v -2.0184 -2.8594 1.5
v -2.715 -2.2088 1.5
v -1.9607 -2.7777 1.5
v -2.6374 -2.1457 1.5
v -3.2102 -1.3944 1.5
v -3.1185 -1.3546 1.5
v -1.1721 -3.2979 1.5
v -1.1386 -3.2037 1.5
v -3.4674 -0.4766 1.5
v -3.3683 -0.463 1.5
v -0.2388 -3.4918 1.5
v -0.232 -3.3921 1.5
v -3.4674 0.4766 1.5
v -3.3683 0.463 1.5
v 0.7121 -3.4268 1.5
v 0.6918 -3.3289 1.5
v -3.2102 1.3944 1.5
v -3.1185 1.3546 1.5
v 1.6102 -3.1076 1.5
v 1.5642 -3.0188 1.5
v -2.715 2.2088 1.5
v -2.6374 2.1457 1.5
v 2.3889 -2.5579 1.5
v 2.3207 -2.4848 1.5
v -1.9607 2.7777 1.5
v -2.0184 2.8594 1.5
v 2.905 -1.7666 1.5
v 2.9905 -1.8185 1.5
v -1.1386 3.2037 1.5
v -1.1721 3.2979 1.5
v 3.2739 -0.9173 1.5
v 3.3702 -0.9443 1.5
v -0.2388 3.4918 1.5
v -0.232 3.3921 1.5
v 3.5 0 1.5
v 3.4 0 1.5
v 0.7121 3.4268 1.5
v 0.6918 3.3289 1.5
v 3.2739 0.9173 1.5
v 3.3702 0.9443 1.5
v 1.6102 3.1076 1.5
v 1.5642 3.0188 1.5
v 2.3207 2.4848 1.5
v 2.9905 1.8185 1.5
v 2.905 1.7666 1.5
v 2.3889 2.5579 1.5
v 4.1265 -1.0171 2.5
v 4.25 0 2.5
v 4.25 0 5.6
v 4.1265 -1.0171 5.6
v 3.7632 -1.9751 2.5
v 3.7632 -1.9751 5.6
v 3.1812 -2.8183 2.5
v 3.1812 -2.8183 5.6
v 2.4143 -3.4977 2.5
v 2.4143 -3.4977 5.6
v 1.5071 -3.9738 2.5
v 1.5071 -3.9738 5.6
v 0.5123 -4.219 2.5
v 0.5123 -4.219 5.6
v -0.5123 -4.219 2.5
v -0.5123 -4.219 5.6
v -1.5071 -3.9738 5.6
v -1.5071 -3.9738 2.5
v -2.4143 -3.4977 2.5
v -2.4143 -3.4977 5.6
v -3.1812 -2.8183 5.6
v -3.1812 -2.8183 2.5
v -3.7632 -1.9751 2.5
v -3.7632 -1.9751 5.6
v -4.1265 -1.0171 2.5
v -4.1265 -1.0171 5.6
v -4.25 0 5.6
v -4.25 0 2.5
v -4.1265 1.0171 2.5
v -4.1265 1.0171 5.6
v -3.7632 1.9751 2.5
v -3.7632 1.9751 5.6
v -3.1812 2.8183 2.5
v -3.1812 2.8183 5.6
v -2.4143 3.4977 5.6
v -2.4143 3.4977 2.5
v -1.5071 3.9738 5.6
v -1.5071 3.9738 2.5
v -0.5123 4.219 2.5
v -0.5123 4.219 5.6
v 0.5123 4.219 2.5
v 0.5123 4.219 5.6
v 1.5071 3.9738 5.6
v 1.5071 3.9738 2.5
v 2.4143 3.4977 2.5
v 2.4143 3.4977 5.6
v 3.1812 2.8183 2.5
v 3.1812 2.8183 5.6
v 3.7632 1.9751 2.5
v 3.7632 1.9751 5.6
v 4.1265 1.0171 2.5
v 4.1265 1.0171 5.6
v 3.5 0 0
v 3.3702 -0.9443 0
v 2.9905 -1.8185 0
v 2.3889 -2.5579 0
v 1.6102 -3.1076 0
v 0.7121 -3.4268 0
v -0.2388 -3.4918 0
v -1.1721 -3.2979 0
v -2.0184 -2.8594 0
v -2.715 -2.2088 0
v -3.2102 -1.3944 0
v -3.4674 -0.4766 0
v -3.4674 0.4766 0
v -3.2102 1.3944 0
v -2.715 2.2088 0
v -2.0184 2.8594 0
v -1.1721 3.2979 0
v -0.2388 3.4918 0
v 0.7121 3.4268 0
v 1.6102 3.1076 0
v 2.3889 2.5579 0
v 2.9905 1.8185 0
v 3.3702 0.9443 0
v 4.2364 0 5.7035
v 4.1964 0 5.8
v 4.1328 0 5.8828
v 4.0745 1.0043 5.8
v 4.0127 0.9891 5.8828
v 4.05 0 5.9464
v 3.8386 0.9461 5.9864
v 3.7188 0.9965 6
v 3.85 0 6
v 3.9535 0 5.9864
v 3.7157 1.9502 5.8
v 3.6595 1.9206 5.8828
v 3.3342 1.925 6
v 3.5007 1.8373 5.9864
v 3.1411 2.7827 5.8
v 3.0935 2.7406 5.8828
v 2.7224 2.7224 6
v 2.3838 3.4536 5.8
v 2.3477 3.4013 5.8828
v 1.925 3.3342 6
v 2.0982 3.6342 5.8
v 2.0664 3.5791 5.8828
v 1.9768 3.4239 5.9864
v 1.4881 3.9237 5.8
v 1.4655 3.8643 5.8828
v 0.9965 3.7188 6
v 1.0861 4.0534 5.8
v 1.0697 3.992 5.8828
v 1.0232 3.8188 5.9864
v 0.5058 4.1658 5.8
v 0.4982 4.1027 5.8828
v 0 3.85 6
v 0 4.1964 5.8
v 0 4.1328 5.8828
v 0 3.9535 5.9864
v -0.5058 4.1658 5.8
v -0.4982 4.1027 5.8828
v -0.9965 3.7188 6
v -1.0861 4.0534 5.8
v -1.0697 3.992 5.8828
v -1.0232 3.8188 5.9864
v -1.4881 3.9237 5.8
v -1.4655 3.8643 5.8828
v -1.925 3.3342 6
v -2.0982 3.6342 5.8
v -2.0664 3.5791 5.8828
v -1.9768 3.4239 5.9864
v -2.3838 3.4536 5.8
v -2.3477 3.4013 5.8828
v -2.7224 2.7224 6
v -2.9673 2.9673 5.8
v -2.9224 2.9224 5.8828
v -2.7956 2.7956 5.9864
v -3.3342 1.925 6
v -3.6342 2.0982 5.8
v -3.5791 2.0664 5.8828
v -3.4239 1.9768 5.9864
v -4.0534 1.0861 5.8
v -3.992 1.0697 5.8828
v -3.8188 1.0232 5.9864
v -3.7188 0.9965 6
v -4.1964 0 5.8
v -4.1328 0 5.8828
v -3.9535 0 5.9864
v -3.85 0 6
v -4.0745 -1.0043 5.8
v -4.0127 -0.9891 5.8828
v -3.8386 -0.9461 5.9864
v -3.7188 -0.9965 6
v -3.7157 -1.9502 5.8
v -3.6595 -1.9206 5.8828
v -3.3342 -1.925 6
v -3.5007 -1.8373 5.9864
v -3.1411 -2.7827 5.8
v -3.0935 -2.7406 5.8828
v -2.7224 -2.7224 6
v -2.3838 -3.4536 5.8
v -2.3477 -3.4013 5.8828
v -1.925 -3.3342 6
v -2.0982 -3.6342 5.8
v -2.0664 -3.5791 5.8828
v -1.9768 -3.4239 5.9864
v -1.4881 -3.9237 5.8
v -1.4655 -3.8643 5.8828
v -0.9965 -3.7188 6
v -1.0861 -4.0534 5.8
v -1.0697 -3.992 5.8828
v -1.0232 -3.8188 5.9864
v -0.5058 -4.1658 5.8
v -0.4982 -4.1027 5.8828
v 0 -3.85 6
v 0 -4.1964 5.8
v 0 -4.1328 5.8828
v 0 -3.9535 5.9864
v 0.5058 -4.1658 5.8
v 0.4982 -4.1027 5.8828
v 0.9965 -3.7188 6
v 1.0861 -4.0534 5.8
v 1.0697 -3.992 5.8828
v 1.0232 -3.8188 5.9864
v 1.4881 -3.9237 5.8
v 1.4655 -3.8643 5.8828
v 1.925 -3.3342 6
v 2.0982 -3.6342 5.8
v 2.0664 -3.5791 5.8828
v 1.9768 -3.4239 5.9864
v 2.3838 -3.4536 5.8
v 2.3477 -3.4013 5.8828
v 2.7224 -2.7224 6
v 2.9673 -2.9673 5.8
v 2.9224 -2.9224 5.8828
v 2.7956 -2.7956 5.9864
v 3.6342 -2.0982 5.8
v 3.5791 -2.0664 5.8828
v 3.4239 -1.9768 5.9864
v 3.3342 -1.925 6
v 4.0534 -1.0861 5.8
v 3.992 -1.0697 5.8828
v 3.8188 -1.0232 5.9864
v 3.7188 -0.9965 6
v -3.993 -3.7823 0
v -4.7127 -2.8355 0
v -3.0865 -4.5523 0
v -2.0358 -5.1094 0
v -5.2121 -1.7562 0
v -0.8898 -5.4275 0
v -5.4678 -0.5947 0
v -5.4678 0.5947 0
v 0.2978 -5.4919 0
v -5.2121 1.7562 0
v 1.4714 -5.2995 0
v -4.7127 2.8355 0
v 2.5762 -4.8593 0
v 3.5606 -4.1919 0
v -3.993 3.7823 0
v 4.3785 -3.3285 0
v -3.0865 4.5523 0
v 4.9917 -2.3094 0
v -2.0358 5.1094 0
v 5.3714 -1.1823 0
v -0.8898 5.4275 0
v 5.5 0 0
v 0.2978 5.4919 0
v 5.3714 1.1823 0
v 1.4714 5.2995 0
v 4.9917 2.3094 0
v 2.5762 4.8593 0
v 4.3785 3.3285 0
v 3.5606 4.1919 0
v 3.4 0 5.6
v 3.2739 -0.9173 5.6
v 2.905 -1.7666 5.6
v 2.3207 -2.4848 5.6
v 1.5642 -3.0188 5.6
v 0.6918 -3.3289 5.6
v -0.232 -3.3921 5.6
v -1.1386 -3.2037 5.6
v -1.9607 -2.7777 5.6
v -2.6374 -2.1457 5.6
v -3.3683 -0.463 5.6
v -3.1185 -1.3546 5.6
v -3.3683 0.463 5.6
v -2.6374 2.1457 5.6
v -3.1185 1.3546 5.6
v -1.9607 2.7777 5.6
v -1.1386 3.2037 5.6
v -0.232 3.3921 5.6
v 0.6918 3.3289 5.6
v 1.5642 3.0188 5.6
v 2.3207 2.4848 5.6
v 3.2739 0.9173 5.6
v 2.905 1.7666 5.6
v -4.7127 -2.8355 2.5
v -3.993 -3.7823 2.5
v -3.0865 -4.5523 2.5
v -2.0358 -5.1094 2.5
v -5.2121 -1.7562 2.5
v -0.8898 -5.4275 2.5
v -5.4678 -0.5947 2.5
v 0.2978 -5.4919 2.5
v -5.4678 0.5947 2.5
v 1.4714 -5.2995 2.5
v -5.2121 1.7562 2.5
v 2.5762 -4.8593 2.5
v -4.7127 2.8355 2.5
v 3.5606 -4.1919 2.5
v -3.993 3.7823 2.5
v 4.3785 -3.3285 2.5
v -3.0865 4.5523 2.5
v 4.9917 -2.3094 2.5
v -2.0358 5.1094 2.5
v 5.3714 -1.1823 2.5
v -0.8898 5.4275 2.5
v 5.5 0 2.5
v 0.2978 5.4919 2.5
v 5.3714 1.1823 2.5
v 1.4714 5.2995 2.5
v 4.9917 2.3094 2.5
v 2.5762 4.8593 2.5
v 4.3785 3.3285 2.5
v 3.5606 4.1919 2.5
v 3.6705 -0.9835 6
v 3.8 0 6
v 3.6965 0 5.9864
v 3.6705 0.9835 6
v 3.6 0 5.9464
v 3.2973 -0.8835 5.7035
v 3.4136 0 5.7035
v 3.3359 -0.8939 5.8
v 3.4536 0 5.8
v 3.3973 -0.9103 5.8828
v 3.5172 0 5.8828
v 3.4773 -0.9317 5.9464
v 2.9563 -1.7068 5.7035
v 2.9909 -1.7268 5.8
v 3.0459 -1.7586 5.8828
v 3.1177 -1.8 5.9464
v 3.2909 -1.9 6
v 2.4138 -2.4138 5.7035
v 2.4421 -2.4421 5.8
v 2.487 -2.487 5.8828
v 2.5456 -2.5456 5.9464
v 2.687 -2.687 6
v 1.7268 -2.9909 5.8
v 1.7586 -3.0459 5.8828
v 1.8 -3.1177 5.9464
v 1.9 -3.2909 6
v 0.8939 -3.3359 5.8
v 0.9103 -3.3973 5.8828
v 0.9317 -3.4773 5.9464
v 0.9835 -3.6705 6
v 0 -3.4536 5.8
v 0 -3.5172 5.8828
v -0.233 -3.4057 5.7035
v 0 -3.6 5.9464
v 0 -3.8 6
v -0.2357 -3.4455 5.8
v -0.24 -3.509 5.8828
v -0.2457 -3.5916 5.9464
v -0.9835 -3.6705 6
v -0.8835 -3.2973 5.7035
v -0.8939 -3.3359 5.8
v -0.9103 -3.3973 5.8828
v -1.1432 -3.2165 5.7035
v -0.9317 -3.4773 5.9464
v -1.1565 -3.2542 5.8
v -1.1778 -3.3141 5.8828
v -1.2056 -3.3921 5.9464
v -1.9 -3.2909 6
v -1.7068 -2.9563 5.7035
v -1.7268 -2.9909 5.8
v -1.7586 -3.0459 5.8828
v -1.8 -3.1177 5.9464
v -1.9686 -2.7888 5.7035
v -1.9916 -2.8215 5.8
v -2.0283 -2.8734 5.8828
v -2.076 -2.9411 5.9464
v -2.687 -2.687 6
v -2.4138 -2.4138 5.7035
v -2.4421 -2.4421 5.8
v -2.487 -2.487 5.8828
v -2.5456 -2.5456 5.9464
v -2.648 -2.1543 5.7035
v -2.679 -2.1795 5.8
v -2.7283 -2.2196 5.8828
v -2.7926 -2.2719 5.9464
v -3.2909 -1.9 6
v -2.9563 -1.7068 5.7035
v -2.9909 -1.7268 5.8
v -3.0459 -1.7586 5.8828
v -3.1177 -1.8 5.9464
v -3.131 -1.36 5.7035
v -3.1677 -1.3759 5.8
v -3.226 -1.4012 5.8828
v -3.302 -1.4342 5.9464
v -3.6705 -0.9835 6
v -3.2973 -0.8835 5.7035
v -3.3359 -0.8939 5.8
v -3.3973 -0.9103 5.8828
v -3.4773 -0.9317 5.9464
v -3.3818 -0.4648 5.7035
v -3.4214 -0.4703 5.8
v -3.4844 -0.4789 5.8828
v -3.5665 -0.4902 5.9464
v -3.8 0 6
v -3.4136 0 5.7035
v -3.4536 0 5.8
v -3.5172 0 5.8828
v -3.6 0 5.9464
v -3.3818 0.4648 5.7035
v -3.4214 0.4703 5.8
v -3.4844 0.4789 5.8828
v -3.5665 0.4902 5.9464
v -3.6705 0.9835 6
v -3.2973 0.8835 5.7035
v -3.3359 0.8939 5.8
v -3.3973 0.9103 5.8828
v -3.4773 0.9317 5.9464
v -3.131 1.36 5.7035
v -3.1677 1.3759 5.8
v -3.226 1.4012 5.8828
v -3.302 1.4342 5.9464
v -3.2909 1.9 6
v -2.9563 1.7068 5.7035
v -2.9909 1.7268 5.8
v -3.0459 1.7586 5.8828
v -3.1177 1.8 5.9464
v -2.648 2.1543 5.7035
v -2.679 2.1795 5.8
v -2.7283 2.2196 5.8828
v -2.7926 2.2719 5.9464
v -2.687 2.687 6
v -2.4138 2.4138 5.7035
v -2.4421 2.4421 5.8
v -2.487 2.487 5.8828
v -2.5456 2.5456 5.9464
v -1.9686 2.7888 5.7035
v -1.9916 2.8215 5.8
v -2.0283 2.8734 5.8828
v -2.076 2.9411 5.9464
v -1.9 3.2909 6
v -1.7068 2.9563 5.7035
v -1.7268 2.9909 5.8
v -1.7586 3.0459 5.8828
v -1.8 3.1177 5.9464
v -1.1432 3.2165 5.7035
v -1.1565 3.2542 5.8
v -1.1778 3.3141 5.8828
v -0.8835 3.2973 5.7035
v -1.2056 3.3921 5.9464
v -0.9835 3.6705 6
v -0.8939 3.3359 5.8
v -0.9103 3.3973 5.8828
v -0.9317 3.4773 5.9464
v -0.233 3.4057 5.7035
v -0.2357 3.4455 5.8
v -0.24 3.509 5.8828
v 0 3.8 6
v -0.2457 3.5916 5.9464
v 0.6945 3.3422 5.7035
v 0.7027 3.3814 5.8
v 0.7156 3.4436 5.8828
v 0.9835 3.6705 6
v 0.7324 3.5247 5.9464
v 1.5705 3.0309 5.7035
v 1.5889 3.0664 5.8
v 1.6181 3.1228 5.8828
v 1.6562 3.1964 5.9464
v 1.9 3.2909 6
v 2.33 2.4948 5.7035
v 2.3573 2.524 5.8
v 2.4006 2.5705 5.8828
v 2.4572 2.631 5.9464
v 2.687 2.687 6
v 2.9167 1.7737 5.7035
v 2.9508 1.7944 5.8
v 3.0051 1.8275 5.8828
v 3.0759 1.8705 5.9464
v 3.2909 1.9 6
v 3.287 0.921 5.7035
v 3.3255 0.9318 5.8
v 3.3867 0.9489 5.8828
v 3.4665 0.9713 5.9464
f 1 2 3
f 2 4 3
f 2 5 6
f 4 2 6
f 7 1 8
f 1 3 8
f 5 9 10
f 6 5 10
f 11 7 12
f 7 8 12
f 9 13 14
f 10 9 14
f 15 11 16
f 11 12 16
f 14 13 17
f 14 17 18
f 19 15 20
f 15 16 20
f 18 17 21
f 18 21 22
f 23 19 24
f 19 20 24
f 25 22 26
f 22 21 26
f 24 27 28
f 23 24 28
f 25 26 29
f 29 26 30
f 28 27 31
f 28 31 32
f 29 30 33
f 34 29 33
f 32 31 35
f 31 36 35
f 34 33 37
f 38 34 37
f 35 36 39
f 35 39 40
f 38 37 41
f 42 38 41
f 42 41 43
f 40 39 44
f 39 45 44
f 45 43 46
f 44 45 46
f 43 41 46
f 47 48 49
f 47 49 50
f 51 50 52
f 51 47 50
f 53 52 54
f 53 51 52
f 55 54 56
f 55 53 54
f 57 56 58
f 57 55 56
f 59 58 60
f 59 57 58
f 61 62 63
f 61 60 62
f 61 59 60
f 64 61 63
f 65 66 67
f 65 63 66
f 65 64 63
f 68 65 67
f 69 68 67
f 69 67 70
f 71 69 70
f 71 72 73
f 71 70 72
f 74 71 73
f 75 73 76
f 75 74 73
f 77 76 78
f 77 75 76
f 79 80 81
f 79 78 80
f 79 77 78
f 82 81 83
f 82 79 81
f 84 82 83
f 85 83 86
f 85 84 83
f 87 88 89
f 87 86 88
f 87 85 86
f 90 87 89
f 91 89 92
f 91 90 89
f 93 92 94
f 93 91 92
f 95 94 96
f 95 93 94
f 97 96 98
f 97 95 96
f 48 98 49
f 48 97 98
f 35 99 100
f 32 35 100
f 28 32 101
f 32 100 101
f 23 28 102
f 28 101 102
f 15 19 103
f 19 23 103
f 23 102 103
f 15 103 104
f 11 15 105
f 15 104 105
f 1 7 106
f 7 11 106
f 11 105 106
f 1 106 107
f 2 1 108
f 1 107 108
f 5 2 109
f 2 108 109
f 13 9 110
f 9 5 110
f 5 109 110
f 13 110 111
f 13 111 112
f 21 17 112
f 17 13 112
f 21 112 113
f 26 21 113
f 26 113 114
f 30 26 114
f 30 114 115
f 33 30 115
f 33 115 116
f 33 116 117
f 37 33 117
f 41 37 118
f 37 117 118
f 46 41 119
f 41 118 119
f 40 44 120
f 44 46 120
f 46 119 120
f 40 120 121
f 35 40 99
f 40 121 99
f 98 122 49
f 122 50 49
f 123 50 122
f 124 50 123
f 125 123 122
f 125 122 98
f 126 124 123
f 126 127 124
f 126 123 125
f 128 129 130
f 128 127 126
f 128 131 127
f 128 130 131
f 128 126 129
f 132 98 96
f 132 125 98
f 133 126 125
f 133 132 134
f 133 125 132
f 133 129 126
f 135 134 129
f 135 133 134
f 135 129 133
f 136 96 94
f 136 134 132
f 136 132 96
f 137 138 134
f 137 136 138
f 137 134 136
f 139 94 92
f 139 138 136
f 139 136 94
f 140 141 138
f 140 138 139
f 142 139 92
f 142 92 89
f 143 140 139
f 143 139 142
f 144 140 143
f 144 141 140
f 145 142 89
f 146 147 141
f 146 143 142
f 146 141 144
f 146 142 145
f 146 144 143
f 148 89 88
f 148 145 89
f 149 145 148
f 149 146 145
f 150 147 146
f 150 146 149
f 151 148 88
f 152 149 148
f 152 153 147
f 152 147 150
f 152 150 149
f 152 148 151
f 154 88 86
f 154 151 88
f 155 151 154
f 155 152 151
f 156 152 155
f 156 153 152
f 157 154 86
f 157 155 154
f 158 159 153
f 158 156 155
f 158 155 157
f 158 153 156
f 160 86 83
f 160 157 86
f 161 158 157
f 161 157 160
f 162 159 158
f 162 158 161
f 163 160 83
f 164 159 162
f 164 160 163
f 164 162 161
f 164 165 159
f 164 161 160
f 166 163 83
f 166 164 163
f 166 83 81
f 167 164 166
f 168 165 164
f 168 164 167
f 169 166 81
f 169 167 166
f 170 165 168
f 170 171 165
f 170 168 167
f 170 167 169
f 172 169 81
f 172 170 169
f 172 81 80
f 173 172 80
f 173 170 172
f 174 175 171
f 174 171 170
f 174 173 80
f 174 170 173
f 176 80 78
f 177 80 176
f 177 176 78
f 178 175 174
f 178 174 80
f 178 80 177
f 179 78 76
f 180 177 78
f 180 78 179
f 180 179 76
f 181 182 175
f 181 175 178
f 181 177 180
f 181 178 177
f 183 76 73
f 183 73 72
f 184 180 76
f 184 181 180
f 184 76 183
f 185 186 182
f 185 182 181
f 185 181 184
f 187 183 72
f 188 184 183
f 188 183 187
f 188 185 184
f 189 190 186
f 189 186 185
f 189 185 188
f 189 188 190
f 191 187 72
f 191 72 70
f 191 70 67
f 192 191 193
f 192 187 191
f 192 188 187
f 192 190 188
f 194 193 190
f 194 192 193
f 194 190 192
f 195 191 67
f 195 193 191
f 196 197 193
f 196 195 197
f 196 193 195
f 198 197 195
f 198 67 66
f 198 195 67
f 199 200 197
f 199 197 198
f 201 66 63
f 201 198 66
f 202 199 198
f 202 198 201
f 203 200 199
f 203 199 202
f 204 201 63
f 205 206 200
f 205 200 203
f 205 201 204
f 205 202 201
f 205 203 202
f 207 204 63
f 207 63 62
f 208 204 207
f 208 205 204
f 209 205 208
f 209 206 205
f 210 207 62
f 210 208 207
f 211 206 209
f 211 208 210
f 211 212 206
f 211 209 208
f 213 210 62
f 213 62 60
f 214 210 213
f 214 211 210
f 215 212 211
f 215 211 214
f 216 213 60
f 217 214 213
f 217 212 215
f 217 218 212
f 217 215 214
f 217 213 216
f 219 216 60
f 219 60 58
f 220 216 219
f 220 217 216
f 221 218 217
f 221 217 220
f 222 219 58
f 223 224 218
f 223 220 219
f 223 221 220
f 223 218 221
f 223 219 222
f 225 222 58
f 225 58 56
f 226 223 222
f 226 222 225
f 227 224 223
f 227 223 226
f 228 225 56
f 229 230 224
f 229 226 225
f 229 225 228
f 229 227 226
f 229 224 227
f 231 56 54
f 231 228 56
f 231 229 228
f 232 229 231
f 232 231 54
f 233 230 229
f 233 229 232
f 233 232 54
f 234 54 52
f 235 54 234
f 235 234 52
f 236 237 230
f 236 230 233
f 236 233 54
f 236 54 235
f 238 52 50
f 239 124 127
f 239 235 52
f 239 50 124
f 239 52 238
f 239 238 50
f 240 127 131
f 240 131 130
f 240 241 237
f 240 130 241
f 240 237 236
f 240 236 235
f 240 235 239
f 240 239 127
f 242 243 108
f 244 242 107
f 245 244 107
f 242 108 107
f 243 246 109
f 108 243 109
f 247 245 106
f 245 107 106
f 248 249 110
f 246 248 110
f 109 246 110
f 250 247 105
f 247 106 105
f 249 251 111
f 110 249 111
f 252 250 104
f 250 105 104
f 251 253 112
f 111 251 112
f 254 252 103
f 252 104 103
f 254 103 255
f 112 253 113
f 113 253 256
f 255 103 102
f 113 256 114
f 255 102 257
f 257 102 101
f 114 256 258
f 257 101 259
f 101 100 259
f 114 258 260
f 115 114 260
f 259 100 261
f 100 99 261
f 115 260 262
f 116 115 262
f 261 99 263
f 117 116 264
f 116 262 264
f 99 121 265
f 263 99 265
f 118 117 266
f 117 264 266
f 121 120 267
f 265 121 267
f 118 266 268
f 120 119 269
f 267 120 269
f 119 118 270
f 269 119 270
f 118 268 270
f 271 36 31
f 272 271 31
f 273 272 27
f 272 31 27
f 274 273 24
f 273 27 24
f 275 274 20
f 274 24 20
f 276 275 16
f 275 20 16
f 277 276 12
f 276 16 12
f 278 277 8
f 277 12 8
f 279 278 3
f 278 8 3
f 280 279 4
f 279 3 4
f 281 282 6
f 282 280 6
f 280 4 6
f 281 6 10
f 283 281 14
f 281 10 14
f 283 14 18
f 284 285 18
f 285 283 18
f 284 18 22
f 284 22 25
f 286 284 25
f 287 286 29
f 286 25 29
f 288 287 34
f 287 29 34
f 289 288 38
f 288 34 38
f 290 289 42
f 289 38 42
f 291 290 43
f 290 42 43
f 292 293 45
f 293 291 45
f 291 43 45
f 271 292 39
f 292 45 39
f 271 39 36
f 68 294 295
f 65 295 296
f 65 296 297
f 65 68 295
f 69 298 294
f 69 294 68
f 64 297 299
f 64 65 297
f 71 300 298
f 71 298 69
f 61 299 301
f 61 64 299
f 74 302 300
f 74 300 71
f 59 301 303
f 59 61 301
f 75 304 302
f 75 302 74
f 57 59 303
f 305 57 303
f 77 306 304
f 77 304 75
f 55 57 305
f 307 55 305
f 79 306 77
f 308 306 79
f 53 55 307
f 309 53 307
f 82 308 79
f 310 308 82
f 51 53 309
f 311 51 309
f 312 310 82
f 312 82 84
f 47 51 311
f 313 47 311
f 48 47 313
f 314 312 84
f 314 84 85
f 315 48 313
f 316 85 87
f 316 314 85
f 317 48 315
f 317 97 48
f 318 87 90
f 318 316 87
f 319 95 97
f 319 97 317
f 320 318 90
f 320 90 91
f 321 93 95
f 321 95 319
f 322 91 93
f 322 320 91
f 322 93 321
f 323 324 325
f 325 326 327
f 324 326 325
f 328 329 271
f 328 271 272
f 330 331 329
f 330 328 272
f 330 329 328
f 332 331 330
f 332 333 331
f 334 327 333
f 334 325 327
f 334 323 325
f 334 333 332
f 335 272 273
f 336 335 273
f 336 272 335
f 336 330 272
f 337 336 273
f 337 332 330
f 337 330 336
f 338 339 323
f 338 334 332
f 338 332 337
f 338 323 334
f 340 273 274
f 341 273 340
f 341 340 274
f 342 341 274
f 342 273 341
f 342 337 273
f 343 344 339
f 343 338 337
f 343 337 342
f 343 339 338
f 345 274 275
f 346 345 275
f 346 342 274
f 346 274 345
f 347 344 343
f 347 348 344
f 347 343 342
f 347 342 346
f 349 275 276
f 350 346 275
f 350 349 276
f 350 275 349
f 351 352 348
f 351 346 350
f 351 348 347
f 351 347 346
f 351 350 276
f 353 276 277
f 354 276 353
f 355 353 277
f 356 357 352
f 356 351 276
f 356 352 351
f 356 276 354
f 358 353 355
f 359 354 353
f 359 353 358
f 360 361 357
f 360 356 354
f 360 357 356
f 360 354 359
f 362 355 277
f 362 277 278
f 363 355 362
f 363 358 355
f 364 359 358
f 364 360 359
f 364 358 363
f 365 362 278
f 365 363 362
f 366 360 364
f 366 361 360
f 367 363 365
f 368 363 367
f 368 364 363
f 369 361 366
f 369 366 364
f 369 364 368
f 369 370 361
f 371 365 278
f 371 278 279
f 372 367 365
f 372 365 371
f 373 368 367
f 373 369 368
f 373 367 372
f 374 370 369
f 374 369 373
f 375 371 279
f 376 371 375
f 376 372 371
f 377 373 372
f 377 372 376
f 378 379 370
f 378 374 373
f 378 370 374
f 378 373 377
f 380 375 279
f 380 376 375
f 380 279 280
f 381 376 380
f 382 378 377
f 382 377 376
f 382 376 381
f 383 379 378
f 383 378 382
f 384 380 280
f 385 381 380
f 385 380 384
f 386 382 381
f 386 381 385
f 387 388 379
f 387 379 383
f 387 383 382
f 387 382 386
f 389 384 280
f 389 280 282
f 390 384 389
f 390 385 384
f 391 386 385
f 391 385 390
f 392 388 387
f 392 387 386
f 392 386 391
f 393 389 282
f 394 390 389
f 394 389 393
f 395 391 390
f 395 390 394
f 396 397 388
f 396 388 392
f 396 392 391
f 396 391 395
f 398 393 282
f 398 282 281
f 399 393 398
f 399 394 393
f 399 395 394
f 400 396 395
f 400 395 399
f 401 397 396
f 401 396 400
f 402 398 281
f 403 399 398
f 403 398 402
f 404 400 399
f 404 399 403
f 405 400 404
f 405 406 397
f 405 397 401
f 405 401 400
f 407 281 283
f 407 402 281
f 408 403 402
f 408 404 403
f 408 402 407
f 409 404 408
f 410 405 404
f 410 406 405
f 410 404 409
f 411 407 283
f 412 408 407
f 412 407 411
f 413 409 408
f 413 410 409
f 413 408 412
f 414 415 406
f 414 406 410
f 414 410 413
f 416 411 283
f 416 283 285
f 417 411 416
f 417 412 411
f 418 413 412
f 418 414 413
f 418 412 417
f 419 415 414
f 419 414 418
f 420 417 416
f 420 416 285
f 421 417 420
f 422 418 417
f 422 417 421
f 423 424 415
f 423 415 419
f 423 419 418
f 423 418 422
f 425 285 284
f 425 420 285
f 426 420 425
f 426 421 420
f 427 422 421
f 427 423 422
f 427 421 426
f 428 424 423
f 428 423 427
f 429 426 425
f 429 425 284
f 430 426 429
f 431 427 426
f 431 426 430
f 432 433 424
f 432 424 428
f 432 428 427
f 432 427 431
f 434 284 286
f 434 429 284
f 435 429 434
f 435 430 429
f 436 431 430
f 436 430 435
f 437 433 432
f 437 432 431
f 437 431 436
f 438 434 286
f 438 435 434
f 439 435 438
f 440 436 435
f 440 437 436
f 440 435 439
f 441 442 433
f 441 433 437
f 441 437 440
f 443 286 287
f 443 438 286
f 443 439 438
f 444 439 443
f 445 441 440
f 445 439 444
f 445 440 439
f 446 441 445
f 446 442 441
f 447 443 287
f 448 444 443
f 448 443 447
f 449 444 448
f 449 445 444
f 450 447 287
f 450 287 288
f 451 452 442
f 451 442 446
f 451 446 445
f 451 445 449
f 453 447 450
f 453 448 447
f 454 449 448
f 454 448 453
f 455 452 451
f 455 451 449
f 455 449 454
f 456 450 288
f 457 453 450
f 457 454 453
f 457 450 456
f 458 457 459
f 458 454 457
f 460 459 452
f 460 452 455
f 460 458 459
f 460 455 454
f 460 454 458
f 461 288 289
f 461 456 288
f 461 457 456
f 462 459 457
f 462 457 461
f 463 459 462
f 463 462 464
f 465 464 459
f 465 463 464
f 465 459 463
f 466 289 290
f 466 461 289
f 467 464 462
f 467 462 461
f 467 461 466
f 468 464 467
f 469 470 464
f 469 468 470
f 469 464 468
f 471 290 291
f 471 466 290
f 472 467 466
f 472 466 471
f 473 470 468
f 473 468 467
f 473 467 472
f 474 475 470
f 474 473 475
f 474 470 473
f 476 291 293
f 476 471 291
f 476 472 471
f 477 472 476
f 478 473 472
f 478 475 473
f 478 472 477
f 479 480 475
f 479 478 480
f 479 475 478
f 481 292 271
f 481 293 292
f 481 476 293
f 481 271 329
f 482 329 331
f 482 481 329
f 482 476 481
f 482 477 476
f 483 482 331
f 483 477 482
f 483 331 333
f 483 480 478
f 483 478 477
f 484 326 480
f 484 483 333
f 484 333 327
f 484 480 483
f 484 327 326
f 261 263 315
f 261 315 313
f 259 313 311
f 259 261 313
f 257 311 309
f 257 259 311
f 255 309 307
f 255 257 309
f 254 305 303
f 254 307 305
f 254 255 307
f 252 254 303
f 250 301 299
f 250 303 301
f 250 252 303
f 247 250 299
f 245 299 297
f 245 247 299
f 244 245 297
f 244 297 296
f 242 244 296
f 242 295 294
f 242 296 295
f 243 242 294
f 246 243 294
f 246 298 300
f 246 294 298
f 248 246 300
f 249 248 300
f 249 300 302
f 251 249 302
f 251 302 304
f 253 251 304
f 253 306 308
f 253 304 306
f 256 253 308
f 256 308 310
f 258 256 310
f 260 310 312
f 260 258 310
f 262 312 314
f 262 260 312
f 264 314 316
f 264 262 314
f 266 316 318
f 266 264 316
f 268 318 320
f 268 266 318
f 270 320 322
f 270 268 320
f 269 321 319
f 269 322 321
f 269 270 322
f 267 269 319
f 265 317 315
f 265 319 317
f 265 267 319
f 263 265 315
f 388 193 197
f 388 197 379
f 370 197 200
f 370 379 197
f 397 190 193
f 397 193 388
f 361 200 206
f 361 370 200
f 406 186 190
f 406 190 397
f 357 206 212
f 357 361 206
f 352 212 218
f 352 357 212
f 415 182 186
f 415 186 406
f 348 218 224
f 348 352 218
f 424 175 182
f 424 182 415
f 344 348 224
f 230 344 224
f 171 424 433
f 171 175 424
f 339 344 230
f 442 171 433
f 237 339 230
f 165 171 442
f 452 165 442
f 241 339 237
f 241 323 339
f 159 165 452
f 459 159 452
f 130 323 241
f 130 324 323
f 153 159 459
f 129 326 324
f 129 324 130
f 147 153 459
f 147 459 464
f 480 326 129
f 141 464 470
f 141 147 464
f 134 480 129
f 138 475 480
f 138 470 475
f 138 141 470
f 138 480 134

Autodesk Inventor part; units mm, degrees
ref_plane "YZ Plane" through (0, 0, 0) normal (1, 0, 0) x (0, 1, 0)
ref_plane "XZ Plane" through (0, 0, 0) normal (0, 1, 0) x (-1, 0, 0)
ref_plane "XY Plane" through (0, 0, 0) normal (0, 0, 1) x (1, 0, 0)
sketch "Sketch1" plane through (0, 0, 0) normal (0, 0, 1) x (1, 0, 0)
  circle A0 centre (0, 0) radius 4.25
  circle A1 centre (0, 0) radius 3.5
  circle A2 centre (0, 0) radius 5.5
  circle A3 centre (0, 0) radius 3.4
  dimension "d0" = 8.5
  dimension "d1" = 7
  dimension "d2" = 11
  dimension "d23" = 6.8
extrude "Extrusion1" add sketch "Sketch1" along normal blind 2.5 contours A2
extrude "Extrusion6" add sketch "Sketch1" along normal blind 6 contours A0 | A1
fillet "Fillet4" radius 0.4 2 edges at (-3.4, 0, 6) (-4.25, 0, 6)
extrude "Extrusion13" cut sketch "Sketch1" along normal blind 1.5 contours A1
properties part number "SmaRing_2.5mm_3.5mm_6.8mm"
